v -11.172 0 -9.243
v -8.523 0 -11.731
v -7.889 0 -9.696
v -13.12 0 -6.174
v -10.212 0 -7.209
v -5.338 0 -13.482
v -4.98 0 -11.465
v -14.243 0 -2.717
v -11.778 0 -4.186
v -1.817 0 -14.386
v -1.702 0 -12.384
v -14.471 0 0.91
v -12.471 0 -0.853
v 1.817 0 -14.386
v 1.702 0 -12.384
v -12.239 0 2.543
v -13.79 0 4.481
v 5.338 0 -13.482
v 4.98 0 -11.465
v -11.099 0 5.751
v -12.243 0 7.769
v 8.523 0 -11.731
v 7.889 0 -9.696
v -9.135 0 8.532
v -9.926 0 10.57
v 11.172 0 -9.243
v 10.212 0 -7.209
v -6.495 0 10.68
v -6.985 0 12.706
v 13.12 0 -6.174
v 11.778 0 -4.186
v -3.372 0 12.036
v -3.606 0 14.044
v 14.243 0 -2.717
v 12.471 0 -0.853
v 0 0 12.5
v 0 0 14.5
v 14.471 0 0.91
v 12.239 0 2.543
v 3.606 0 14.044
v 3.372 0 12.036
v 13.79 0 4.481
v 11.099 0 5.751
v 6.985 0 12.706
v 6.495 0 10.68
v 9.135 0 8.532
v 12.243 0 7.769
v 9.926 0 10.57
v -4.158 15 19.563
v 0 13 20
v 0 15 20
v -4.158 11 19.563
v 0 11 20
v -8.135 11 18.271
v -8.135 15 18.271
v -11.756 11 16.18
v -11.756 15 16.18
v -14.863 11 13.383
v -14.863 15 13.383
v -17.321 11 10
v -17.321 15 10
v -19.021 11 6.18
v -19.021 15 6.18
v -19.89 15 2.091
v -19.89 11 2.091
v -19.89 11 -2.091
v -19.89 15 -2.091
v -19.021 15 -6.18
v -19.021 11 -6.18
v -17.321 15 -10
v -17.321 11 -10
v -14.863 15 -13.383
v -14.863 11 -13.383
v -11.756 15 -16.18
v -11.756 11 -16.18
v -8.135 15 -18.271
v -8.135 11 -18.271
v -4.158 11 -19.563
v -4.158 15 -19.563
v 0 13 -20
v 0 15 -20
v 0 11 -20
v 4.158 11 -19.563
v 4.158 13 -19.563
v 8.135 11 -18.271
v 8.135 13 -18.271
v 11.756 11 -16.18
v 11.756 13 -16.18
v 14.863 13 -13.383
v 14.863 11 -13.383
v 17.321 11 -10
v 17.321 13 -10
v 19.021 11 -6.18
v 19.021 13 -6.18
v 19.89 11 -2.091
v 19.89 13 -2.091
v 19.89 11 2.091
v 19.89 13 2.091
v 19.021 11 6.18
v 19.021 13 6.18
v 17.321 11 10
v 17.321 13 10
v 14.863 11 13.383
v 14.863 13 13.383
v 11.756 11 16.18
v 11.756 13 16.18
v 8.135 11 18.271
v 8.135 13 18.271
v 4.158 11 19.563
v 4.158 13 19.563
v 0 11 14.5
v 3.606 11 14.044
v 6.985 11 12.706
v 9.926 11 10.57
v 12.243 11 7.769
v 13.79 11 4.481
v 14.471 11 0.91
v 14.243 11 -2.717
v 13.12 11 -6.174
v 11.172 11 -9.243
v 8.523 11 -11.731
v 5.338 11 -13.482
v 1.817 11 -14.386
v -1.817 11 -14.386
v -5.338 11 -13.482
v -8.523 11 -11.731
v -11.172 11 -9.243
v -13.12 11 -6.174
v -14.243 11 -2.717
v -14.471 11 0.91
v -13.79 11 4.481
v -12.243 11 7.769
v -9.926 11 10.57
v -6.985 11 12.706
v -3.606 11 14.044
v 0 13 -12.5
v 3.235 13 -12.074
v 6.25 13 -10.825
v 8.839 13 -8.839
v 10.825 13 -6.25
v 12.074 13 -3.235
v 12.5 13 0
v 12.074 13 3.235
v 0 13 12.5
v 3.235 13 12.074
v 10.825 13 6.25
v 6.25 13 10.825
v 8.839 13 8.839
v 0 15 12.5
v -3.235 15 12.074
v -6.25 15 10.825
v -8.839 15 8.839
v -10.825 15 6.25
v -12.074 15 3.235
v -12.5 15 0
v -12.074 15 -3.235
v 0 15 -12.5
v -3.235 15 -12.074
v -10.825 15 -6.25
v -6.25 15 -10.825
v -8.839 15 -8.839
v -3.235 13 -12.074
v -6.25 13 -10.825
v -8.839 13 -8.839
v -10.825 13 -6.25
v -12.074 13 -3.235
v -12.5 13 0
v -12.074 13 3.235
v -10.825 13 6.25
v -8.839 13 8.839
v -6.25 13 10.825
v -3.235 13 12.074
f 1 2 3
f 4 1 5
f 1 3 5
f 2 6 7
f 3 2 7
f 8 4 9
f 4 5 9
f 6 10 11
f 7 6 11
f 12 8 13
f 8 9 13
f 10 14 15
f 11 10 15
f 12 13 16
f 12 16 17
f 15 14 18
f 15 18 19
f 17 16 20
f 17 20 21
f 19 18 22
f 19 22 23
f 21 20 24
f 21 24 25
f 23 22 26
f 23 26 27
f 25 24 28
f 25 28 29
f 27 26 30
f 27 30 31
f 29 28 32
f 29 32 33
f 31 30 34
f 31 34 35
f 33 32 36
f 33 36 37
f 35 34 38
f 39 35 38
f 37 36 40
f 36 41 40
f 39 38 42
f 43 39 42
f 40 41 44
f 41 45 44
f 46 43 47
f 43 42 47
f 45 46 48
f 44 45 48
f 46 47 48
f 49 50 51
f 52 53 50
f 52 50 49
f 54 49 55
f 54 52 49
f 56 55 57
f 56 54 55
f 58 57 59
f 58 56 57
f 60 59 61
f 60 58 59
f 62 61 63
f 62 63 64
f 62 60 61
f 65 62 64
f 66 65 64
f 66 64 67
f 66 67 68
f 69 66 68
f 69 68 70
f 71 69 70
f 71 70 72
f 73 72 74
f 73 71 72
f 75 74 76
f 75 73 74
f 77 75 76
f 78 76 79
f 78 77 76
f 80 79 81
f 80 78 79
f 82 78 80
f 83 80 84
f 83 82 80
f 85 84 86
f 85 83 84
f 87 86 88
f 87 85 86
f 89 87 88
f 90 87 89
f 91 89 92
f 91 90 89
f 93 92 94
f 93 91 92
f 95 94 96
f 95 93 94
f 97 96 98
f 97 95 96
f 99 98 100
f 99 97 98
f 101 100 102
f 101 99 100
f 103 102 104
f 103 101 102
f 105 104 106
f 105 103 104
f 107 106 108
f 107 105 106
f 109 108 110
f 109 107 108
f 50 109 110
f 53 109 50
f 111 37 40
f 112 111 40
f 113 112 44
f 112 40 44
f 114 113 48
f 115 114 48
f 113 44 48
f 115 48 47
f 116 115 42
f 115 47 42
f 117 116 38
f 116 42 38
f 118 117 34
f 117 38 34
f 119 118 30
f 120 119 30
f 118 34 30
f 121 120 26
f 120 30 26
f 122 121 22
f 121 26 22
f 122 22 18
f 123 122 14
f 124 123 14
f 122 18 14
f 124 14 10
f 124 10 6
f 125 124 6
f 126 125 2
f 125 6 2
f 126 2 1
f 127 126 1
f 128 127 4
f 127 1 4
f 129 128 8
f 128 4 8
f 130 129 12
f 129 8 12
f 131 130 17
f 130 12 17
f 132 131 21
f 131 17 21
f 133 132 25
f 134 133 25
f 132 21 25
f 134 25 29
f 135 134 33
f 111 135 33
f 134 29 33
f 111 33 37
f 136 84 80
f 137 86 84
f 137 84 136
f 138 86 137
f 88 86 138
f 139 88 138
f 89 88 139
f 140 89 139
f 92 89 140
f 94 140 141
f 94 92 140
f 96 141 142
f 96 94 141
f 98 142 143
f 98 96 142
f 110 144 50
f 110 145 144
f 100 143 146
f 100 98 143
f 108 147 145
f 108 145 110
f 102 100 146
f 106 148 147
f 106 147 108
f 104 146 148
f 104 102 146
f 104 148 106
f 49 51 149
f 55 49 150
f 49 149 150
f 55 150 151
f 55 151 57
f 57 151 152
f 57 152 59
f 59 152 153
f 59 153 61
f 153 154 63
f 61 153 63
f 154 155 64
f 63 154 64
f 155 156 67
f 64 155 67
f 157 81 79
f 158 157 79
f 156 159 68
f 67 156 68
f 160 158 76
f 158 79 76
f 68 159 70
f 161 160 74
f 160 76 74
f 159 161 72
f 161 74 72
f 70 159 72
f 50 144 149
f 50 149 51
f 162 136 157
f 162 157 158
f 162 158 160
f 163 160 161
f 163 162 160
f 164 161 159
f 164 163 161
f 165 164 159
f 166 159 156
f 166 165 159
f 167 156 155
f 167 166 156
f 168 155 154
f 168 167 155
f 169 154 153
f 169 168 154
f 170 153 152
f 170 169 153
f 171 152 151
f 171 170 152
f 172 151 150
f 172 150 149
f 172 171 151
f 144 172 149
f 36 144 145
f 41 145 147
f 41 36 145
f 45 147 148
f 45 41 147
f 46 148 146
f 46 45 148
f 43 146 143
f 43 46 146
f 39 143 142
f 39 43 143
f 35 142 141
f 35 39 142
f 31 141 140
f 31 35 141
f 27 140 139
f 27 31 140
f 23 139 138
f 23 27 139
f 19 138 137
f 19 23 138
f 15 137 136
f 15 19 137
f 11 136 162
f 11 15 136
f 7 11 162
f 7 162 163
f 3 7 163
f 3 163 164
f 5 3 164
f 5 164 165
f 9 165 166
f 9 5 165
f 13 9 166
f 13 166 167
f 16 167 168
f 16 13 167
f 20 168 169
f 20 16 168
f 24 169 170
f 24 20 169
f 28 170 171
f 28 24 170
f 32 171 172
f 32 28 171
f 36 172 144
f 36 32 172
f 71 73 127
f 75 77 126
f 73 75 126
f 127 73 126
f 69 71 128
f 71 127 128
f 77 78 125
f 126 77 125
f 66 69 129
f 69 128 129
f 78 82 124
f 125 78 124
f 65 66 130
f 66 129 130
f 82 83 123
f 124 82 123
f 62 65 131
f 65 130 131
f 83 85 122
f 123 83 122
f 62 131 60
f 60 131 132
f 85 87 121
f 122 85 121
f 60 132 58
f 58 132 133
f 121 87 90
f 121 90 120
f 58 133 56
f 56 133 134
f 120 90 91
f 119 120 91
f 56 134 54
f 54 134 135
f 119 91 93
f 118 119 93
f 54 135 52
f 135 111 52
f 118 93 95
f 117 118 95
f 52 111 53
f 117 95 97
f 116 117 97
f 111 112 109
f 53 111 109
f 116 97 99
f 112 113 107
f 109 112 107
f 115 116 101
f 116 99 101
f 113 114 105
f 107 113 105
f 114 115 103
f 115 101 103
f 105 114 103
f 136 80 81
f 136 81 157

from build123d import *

# Parameters (mm, degrees)
SKETCH_2_R      = 14.5
SKETCH_2_R_2    = 12.5
EXTRUDE_1_DEPTH = 11
SKETCH_3_R      = 20
SKETCH_3_R_2    = 12.5
EXTRUDE_2_DEPTH = 2
EXTRUDE_3_DEPTH = 2


with BuildPart() as part:
    # 草圖2 → 填料-伸長1 (new body)
    with BuildSketch(Plane(origin=(0, 0, 0), x_dir=(1, 0, 0), z_dir=(0, 1, 0))):
        with Locations(Location((0, 0, 0), (0, 0, 270))):
            Circle(SKETCH_2_R)
        with Locations(Location((0, 0, 0), (0, 0, 270))):
            Circle(SKETCH_2_R_2, mode=Mode.SUBTRACT)
    extrude(amount=EXTRUDE_1_DEPTH)

    # 草圖3 → 填料-伸長2 (add)
    with BuildSketch(Plane(origin=(0, 11, 0), x_dir=(1, 0, 0), z_dir=(0, 1, 0))):
        with Locations(Location((0, 0, 0), (0, 0, 270))):
            Circle(SKETCH_3_R)
        with Locations(Location((0, 0, 0), (0, 0, 270))):
            Circle(SKETCH_3_R_2, mode=Mode.SUBTRACT)
    extrude(amount=EXTRUDE_2_DEPTH)

    # 草圖4 → 填料-伸長3 (add)
    with BuildSketch(Plane(origin=(0, 13, 0), x_dir=(1, 0, 0), z_dir=(0, 1, 0))):
        with BuildLine():
            Line((0, 20), (0, 12.5))
            ThreePointArc((0, 12.5), (-12.5, 0), (0, -12.5))
            Line((0, -12.5), (0, -20))
            ThreePointArc((0, -20), (-20, 0), (0, 20))
        make_face()
    extrude(amount=EXTRUDE_3_DEPTH)


solid = part.part
